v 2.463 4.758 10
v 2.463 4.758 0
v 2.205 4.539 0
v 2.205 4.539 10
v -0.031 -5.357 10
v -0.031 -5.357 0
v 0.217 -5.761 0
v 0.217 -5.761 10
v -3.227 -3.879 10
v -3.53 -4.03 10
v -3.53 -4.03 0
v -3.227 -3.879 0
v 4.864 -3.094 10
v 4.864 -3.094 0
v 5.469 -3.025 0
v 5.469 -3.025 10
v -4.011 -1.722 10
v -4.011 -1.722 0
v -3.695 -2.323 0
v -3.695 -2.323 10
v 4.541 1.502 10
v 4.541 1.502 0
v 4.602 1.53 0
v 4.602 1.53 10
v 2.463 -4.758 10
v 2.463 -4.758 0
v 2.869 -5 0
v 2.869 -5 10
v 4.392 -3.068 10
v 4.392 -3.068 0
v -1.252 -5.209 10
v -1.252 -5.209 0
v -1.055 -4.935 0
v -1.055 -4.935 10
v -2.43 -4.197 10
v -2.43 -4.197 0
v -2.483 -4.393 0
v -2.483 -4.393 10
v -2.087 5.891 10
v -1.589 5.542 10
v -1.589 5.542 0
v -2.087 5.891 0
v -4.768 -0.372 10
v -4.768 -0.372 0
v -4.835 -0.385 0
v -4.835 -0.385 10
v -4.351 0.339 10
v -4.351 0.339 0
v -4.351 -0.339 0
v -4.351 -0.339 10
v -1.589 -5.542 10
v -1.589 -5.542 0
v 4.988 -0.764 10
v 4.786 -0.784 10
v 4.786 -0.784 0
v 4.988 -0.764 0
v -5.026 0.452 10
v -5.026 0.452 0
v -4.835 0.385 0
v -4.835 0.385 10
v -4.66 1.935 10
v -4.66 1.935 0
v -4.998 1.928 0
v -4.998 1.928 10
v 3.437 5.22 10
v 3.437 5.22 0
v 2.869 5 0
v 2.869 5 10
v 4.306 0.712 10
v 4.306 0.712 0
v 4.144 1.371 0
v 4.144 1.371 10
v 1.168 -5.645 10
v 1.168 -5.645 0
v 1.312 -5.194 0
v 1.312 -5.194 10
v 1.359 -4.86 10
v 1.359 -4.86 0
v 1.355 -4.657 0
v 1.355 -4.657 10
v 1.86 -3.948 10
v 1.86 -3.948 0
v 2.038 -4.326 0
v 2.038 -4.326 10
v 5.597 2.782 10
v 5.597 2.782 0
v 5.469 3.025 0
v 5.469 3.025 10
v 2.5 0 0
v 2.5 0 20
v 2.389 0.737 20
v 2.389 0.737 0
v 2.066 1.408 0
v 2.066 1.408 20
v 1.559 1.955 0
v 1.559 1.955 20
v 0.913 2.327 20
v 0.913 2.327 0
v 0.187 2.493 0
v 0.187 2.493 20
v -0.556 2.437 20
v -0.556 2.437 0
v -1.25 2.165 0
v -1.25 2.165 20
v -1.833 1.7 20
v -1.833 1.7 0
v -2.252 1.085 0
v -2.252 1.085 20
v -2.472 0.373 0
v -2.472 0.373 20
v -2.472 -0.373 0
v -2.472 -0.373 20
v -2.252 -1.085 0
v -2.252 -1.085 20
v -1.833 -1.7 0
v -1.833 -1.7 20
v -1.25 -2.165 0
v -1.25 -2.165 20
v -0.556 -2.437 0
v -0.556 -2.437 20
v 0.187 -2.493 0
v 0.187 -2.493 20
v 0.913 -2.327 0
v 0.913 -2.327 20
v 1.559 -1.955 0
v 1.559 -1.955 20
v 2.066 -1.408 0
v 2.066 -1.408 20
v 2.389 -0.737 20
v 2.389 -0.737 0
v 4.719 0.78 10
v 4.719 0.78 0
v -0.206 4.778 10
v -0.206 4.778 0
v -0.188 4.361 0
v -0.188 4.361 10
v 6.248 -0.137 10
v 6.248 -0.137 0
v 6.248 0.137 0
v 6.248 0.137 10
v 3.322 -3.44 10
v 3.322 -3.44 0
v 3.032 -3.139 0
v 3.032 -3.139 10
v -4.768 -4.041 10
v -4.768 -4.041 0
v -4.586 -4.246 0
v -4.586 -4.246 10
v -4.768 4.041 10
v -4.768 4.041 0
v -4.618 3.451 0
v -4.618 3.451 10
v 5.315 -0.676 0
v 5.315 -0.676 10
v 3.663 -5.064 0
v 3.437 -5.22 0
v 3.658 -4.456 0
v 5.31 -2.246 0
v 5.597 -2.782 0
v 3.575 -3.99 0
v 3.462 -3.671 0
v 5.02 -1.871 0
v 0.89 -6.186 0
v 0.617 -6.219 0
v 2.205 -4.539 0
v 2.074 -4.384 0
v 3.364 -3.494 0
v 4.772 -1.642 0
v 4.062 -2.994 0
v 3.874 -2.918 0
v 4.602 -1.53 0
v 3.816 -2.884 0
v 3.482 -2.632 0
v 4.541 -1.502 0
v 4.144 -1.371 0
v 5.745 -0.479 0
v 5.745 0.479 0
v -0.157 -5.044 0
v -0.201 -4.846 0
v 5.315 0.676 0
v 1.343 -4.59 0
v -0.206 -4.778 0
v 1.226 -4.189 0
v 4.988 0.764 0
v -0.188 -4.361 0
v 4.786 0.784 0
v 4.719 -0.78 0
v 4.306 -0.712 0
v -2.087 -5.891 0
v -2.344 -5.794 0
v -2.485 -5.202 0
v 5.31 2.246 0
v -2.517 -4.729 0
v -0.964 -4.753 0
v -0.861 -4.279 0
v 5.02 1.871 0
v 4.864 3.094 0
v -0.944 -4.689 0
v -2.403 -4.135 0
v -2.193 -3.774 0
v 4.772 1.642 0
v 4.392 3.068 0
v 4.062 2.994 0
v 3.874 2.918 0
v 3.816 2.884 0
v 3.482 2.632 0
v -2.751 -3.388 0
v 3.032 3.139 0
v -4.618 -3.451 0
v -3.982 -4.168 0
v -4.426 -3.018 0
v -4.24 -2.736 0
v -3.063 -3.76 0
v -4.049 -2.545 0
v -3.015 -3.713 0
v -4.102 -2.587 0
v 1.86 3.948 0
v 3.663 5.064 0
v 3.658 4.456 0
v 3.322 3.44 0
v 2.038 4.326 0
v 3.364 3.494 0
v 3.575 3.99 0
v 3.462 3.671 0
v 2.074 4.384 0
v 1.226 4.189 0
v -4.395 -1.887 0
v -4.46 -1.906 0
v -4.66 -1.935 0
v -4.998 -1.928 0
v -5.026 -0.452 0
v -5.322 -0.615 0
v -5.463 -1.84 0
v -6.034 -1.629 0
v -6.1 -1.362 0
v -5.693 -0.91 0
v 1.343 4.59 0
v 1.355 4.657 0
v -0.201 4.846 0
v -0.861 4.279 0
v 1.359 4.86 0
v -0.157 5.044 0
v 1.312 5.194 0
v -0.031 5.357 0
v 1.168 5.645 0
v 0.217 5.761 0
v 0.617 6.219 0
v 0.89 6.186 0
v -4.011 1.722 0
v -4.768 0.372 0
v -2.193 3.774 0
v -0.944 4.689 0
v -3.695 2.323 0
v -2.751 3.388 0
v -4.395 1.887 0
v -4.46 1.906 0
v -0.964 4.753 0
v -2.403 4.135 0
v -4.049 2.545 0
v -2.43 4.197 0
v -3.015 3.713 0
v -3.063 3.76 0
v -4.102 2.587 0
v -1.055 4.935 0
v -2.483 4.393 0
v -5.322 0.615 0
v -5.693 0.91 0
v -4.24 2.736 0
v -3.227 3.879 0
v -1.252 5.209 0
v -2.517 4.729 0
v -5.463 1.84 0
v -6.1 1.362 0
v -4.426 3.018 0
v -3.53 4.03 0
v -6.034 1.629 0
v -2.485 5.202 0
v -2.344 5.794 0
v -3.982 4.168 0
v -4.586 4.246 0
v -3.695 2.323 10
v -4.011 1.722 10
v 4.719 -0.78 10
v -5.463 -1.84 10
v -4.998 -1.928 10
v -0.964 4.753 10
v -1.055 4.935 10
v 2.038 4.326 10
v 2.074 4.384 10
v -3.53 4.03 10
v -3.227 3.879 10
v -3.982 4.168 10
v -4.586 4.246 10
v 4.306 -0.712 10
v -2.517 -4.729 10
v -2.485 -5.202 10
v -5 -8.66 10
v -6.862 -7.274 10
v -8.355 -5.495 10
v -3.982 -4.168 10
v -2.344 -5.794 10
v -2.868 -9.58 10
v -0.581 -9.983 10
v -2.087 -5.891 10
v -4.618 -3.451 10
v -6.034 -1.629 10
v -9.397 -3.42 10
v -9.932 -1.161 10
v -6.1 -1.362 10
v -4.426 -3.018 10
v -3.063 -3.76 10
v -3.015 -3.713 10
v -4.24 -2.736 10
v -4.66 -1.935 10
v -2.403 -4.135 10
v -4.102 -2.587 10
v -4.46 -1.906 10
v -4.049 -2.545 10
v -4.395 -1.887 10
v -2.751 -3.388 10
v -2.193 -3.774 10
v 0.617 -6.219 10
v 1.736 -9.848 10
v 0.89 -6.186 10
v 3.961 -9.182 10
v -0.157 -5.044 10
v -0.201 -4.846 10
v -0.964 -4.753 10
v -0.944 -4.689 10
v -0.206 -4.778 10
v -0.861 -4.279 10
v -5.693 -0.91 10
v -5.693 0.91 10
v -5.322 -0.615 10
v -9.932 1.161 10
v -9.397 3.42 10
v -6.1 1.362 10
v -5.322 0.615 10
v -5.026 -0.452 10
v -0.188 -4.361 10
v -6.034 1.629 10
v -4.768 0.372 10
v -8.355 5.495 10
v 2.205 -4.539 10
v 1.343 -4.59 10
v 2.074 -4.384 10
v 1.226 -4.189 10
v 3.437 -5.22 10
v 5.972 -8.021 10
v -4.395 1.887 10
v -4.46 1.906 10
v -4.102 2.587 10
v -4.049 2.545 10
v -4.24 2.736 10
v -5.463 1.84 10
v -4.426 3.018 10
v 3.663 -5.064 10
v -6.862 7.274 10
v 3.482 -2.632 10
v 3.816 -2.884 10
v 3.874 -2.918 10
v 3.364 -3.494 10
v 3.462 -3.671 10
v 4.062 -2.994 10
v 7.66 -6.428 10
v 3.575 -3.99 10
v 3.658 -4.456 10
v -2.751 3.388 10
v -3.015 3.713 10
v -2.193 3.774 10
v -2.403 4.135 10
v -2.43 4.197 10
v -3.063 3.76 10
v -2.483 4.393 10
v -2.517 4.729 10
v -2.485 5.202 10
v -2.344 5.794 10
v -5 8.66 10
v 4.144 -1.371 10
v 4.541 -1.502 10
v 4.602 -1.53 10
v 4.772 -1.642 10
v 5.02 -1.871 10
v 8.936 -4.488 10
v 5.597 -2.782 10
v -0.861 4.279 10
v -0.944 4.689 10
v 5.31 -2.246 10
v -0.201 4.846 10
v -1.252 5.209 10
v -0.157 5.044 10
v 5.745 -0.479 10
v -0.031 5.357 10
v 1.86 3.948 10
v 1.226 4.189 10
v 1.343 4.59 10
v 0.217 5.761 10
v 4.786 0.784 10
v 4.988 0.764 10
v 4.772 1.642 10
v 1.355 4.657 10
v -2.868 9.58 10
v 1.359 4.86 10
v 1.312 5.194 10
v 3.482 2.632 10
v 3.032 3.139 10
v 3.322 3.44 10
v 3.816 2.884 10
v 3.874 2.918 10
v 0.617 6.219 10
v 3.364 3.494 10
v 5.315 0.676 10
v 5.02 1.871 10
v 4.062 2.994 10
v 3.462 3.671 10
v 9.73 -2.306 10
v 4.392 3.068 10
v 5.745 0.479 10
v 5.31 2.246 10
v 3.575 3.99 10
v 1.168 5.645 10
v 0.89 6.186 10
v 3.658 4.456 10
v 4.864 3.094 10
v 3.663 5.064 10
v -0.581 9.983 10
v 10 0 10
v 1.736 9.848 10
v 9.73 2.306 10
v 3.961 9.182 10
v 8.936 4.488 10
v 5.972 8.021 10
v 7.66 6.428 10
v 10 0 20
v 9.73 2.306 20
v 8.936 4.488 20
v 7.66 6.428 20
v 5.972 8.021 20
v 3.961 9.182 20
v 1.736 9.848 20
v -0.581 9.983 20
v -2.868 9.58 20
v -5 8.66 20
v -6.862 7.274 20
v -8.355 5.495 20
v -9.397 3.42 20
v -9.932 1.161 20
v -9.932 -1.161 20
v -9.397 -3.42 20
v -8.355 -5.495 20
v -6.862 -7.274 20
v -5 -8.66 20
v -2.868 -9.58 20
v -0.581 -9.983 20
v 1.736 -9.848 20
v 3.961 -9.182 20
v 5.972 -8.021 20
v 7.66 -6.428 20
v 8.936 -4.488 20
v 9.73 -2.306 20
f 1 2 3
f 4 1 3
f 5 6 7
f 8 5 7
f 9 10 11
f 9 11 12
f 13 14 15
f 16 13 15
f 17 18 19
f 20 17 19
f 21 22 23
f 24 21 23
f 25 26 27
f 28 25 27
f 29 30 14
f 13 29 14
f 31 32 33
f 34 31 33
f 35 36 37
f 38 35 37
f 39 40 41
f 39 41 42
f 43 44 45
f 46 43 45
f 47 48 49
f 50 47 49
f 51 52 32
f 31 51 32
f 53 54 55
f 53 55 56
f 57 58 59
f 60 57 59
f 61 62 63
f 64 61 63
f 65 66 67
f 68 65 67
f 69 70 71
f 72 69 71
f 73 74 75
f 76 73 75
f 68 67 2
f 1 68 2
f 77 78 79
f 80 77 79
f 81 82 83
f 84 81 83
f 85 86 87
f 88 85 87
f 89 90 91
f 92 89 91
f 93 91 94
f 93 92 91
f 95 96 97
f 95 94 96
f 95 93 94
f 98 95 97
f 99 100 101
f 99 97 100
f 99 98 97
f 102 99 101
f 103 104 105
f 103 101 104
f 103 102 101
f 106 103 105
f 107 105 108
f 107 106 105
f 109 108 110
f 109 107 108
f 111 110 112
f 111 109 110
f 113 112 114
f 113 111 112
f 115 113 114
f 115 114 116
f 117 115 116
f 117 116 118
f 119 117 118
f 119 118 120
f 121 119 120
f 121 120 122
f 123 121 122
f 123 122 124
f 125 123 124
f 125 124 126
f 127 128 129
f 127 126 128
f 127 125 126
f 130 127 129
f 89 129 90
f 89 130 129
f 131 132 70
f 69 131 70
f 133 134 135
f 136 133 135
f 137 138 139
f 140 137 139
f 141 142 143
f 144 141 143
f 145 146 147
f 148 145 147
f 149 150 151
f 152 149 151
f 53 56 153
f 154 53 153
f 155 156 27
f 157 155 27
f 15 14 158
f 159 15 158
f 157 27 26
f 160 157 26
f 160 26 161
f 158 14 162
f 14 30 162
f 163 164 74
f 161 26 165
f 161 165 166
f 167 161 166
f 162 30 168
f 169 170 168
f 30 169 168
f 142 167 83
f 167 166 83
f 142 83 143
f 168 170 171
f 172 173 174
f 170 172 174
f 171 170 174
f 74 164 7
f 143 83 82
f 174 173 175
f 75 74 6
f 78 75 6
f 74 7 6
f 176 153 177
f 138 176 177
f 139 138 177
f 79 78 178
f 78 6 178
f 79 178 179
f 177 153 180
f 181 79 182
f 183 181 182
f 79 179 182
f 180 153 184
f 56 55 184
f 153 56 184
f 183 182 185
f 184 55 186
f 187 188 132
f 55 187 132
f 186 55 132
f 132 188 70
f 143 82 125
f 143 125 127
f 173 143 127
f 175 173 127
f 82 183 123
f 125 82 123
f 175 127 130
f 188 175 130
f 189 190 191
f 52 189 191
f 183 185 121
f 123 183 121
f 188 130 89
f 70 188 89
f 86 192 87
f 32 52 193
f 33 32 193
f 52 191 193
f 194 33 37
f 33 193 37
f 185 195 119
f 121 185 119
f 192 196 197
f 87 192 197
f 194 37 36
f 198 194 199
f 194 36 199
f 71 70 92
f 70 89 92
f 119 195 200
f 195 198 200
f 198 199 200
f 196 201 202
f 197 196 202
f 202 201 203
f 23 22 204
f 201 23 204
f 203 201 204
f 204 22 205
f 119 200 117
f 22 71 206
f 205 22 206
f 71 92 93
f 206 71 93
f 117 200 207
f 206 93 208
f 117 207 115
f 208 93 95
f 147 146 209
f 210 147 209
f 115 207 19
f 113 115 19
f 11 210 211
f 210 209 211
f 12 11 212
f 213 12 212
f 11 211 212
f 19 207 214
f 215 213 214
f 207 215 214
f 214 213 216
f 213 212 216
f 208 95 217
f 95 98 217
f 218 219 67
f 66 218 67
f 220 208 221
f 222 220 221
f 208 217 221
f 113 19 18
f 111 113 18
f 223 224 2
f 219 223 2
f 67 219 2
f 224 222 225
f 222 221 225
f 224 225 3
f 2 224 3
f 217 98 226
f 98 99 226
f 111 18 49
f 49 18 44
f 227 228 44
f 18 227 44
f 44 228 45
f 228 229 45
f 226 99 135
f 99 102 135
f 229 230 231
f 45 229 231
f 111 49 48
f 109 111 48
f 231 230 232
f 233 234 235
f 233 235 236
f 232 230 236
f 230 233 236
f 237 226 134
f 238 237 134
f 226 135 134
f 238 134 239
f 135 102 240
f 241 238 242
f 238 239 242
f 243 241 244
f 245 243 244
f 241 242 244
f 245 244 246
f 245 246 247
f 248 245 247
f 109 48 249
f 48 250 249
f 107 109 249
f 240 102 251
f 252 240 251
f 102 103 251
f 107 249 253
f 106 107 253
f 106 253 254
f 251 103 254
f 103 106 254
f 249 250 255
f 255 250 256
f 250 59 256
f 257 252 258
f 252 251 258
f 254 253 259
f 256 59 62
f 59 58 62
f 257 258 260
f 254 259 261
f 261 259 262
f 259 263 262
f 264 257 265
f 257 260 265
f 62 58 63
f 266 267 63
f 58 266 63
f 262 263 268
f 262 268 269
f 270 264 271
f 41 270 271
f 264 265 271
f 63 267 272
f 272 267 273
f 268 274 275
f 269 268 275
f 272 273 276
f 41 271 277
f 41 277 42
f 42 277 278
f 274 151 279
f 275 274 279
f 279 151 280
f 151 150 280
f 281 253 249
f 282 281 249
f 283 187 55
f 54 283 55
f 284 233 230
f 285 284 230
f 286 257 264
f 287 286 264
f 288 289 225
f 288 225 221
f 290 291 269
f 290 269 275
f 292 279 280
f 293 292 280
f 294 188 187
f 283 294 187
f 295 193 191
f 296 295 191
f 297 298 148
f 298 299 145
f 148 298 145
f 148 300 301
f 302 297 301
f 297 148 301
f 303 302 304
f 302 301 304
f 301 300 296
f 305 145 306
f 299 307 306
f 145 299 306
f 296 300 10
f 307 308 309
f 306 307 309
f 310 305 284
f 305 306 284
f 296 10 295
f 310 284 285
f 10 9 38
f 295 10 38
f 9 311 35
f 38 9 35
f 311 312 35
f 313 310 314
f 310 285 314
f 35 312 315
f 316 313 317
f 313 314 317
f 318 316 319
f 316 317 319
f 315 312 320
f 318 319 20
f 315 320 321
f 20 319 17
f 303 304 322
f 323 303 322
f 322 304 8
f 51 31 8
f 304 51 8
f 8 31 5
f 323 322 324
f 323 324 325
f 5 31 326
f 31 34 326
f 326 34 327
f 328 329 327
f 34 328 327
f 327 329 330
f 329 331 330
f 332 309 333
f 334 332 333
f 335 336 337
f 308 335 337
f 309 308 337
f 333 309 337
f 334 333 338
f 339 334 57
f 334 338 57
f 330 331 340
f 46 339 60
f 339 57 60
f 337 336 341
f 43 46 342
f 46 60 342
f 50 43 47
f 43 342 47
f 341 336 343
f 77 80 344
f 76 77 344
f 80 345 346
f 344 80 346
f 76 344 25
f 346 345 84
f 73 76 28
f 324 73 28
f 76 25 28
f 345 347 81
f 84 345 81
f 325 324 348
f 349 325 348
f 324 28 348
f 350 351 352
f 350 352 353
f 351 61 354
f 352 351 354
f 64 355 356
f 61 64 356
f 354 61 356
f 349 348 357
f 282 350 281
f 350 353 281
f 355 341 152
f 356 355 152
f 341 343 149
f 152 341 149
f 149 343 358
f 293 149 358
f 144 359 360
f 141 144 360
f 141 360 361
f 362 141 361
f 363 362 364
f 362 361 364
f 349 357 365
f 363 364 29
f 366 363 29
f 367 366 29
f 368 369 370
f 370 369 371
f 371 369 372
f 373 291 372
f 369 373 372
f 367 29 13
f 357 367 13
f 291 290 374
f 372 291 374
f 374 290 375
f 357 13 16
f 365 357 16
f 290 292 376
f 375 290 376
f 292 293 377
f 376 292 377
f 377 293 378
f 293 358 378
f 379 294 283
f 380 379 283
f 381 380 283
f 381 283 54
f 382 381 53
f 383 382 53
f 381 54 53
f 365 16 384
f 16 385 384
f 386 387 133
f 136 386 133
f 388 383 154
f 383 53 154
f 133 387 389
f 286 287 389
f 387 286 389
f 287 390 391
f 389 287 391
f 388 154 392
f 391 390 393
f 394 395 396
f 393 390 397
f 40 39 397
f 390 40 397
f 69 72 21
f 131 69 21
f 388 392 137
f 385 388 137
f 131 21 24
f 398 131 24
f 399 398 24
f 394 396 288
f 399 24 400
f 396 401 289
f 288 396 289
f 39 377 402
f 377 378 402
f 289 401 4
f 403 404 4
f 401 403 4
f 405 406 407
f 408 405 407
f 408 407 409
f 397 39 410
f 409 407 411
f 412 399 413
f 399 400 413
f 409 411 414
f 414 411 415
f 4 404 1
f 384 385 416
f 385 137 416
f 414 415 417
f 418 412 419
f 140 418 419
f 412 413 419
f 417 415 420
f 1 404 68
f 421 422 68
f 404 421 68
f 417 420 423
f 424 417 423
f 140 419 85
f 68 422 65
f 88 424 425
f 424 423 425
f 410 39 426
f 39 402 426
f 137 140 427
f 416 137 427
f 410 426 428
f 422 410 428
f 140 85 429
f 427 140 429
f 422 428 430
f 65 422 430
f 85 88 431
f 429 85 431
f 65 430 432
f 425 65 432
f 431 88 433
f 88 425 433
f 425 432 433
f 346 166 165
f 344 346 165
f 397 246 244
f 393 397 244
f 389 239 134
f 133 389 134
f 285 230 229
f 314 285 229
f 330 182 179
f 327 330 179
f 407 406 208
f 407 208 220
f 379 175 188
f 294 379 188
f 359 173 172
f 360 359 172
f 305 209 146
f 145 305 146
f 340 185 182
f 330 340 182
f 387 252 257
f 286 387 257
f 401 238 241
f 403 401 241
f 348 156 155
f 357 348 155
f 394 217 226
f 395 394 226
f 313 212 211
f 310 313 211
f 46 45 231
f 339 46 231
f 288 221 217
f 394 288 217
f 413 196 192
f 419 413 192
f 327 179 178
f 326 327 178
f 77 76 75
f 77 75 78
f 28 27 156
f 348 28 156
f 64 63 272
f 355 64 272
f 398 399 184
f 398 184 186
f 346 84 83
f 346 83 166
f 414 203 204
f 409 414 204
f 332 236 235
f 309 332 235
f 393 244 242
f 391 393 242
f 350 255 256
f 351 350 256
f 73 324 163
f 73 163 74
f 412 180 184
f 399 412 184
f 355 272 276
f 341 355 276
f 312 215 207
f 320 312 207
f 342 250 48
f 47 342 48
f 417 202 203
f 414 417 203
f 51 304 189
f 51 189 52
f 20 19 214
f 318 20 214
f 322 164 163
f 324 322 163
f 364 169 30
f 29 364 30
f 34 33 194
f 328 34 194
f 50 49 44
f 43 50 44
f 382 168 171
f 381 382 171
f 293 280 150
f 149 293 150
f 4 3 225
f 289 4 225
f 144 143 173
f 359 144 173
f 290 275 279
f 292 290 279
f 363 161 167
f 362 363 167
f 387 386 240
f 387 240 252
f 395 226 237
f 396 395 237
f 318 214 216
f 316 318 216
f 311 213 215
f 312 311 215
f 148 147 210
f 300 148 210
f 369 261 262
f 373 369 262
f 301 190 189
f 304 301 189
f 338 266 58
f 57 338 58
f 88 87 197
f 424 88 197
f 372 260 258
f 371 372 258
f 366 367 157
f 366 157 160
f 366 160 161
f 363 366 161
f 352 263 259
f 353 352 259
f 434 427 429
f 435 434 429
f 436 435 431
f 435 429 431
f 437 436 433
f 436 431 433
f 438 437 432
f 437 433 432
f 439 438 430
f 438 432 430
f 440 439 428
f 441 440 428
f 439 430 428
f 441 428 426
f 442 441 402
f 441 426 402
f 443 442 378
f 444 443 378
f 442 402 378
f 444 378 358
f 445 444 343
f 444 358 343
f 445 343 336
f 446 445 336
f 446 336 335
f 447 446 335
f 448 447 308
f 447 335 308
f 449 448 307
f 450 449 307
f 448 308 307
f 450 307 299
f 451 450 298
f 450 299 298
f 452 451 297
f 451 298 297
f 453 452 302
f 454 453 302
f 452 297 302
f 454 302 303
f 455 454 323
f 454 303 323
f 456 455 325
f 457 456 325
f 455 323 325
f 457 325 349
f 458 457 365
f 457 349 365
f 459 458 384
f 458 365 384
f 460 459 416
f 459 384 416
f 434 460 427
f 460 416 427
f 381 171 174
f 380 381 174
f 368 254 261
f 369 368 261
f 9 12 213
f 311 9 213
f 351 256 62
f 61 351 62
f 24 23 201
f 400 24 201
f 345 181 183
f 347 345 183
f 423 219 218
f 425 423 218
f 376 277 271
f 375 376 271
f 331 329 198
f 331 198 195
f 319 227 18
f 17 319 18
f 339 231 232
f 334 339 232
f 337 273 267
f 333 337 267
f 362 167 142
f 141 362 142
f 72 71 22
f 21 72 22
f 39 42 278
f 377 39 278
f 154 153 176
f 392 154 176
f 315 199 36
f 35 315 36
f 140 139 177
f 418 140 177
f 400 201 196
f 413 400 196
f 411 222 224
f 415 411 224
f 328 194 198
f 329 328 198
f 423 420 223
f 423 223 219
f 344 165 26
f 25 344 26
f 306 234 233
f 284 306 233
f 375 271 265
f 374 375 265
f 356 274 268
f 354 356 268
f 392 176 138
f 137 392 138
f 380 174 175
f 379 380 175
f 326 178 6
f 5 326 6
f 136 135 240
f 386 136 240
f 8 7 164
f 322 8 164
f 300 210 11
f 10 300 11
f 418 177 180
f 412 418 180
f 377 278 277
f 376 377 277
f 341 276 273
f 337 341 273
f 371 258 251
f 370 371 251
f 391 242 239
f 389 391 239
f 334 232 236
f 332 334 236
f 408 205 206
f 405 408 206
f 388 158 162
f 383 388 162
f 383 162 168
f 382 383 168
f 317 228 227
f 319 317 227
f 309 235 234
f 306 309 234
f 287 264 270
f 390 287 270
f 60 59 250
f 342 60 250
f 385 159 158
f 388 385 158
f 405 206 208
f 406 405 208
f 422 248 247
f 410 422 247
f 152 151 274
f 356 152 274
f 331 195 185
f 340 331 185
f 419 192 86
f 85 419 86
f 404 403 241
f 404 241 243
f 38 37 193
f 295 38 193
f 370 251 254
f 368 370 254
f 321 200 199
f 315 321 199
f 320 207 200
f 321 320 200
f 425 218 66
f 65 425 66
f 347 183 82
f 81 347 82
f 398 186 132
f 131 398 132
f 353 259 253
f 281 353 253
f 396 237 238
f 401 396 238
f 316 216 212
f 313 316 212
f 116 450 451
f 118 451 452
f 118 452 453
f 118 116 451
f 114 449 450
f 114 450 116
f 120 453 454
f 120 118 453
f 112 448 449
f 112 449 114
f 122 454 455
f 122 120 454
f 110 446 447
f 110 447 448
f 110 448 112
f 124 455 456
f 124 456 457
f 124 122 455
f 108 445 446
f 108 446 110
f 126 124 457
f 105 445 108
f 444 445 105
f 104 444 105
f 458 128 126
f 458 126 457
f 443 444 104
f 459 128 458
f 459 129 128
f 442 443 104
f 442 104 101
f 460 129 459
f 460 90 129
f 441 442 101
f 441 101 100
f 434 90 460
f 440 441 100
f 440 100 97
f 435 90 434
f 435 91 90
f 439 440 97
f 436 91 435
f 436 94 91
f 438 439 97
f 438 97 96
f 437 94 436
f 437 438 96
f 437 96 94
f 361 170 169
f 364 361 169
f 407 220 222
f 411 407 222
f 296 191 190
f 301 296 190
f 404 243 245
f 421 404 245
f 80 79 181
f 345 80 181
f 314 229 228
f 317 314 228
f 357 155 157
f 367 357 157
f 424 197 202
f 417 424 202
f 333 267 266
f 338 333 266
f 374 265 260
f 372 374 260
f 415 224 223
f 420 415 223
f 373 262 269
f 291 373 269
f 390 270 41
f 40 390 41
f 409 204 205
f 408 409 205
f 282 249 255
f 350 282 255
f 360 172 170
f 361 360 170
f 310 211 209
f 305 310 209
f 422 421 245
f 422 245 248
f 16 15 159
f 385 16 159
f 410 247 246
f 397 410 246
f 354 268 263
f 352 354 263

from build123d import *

# Parameters (mm, degrees)
CYLINDER003_R          = 2.5
CYLINDER003_DEPTH      = 22
CYLINDER002_R          = 10
CYLINDER002_DEPTH      = 10
LINEAREXTRUDE002_DEPTH = 10


with BuildPart() as cylinder003:
    # cylinder003 → cylinder003 (new body)
    with BuildSketch(Plane.XY.offset(-1)):
        Circle(CYLINDER003_R)
    extrude(amount=CYLINDER003_DEPTH)


with BuildPart() as cylinder002:
    # cylinder002 → cylinder002 (new body)
    with BuildSketch(Plane.XY.offset(10)):
        Circle(CYLINDER002_R)
    extrude(amount=CYLINDER002_DEPTH)


with BuildPart() as difference003:
    # union002 → LinearExtrude002 (new body)
    with BuildSketch(Plane(origin=(0, 0, 0), x_dir=(0, 1, 0), z_dir=(0, 0, 1))):
        Polygon((0.711931, -4.306123), (1.370771, -4.143733), (1.502069, -4.540636), (1.530367, -4.602072), (1.641751, -4.771632), (1.871155, -5.020002), (2.245545, -5.309618), (2.782207, -5.596589), (3.025427, -5.468937), (3.094113, -4.864255), (3.068442, -4.391617), (2.994354, -4.061731), (2.918082, -3.873743), (2.883597, -3.815555), (2.631538, -3.482032), (3.139447, -3.032064), (3.440155, -3.322487), (3.493763, -3.363735), (3.671187, -3.46211), (3.989737, -3.575421), (4.455834, -3.657875), (5.064387, -3.662577), (5.220426, -3.436516), (5.000234, -2.869177), (4.757857, -2.462607), (4.53895, -2.204938), (4.384052, -2.073928), (4.326475, -2.038431), (3.948292, -1.860249), (4.188912, -1.225786), (4.590143, -1.343197), (4.656779, -1.354807), (4.859597, -1.359461), (5.194318, -1.311756), (5.645345, -1.168159), (6.186377, -0.889514), (6.219486, -0.616832), (5.76086, -0.216806), (5.357304, 0.030555), (5.043726, 0.156979), (4.845688, 0.200998), (4.77821, 0.205671), (4.36054, 0.187693), (4.278749, 0.861305), (4.688584, 0.943805), (4.752983, 0.964491), (4.934732, 1.054624), (5.208943, 1.252418), (5.541575, 1.58917), (5.891142, 2.087328), (5.793738, 2.344162), (5.201743, 2.485233), (4.729457, 2.516719), (4.393046, 2.482935), (4.197235, 2.429879), (4.135314, 2.402658), (3.773841, 2.192639), (3.388376, 2.751081), (3.712928, 3.01459), (3.760337, 3.062835), (3.879381, 3.227107), (4.030263, 3.529677), (4.168298, 3.982437), (4.246318, 4.585986), (4.040715, 4.768136), (3.45097, 4.617935), (3.018149, 4.426332), (2.735972, 4.240079), (2.587247, 4.102103), (2.545069, 4.049224), (2.322601, 3.695276), (1.721767, 4.010618), (1.886685, 4.394771), (1.906243, 4.459522), (1.93531, 4.6603), (1.928298, 4.99833), (1.840114, 5.463378), (1.628715, 6.034052), (1.362012, 6.099788), (0.909622, 5.692724), (0.61542, 5.321926), (0.452121, 5.025874), (0.384552, 4.834585), (0.371779, 4.768162), (0.339281, 4.351371), (-0.339281, 4.351371), (-0.371779, 4.768162), (-0.384552, 4.834585), (-0.452121, 5.025874), (-0.61542, 5.321926), (-0.909622, 5.692724), (-1.362012, 6.099788), (-1.628715, 6.034052), (-1.840114, 5.463378), (-1.928298, 4.99833), (-1.93531, 4.6603), (-1.906243, 4.459522), (-1.886685, 4.394771), (-1.721767, 4.010618), (-2.322601, 3.695276), (-2.545069, 4.049224), (-2.587247, 4.102103), (-2.735972, 4.240079), (-3.018149, 4.426332), (-3.45097, 4.617935), (-4.040715, 4.768136), (-4.246318, 4.585986), (-4.168298, 3.982437), (-4.030263, 3.529677), (-3.879381, 3.227107), (-3.760337, 3.062835), (-3.712928, 3.01459), (-3.388376, 2.751081), (-3.773841, 2.192638), (-4.135314, 2.402658), (-4.197235, 2.429879), (-4.393046, 2.482935), (-4.729457, 2.516719), (-5.201743, 2.485233), (-5.793738, 2.344162), (-5.891142, 2.087328), (-5.541575, 1.58917), (-5.208943, 1.252418), (-4.934732, 1.054624), (-4.752983, 0.964491), (-4.688584, 0.943805), (-4.278749, 0.861305), (-4.36054, 0.187693), (-4.77821, 0.205671), (-4.845688, 0.200998), (-5.043726, 0.156979), (-5.357304, 0.030555), (-5.76086, -0.216806), (-6.219486, -0.616832), (-6.186377, -0.889514), (-5.645345, -1.168159), (-5.194318, -1.311756), (-4.859597, -1.359461), (-4.656779, -1.354807), (-4.590143, -1.343197), (-4.188912, -1.225786), (-3.948292, -1.860249), (-4.326475, -2.038431), (-4.384052, -2.073928), (-4.53895, -2.204938), (-4.757857, -2.462607), (-5.000234, -2.869177), (-5.220426, -3.436516), (-5.064387, -3.662577), (-4.455834, -3.657875), (-3.989737, -3.575421), (-3.671187, -3.46211), (-3.493763, -3.363735), (-3.440155, -3.322487), (-3.139447, -3.032064), (-2.631537, -3.482032), (-2.883597, -3.815555), (-2.918082, -3.873743), (-2.994354, -4.061731), (-3.068442, -4.391617), (-3.094113, -4.864255), (-3.025427, -5.468937), (-2.782207, -5.596589), (-2.245545, -5.309618), (-1.871155, -5.020002), (-1.641751, -4.771632), (-1.530367, -4.602072), (-1.502069, -4.540636), (-1.370771, -4.143733), (-0.71193, -4.306122), (-0.780122, -4.71858), (-0.783616, -4.78613), (-0.763789, -4.98803), (-0.676085, -5.31456), (-0.47917, -5.74499), (-0.137342, -6.24849), (0.137342, -6.24849), (0.47917, -5.74499), (0.676085, -5.31456), (0.763789, -4.98803), (0.783616, -4.78613), (0.780122, -4.71858), align=None)
    extrude(amount=LINEAREXTRUDE002_DEPTH)

    # union003: union cylinder002
    add(cylinder002.part)

    # difference003: cut cylinder003
    add(cylinder003.part, mode=Mode.SUBTRACT)


solid = difference003.part
